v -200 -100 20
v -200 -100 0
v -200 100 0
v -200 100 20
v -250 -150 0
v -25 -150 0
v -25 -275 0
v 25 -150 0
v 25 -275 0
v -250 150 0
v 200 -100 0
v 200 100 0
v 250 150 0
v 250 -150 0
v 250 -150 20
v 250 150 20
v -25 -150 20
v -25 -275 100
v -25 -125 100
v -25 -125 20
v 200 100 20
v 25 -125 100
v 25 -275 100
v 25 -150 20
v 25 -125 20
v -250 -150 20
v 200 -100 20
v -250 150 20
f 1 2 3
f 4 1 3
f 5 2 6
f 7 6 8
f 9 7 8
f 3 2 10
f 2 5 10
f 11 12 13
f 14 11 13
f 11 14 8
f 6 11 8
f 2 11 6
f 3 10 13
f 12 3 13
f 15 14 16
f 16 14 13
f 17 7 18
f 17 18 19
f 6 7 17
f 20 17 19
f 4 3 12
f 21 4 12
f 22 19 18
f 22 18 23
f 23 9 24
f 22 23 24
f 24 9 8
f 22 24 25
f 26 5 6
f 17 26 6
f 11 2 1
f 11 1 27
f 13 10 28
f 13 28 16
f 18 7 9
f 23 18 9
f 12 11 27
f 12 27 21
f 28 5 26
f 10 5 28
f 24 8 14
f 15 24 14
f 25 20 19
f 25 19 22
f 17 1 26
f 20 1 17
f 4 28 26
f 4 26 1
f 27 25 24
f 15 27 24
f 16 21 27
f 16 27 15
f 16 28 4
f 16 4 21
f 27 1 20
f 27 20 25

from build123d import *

# Parameters (mm, degrees)
SKETCH_1_W          = 500
SKETCH_1_H          = 300
EXTRUDE_1_DEPTH     = 20
SKETCH_2_W          = 450
SKETCH_2_H          = 250
EXTRUDE_2_DEPTH     = 10
SKETCH_3_W          = 400
SKETCH_3_H          = 200
CUT_EXTRUDE_1_DEPTH = 293.232783924
SKETCH_4_W          = 50
SKETCH_4_H          = 150
EXTRUDE_3_DEPTH     = 100


with BuildPart() as part:
    # 草图1 → 凸台-拉伸1 (new body)
    with BuildSketch(Plane.XY):
        Rectangle(SKETCH_1_W, SKETCH_1_H)
    extrude(amount=EXTRUDE_1_DEPTH)

    # 草图2 → 凸台-拉伸2 (add)
    with BuildSketch(Plane.XY):
        Rectangle(SKETCH_2_W, SKETCH_2_H)
    extrude(amount=EXTRUDE_2_DEPTH)

    # 草图3 → 切除-拉伸1 (cut, through all)
    with BuildSketch(Plane.XY):
        Rectangle(SKETCH_3_W, SKETCH_3_H)
    extrude(amount=CUT_EXTRUDE_1_DEPTH, mode=Mode.SUBTRACT)

    # 草图4 → 凸台-拉伸3 (add)
    with BuildSketch(Plane.XY):
        with Locations((0, -200)):
            Rectangle(SKETCH_4_W, SKETCH_4_H)
    extrude(amount=EXTRUDE_3_DEPTH)


solid = part.part
